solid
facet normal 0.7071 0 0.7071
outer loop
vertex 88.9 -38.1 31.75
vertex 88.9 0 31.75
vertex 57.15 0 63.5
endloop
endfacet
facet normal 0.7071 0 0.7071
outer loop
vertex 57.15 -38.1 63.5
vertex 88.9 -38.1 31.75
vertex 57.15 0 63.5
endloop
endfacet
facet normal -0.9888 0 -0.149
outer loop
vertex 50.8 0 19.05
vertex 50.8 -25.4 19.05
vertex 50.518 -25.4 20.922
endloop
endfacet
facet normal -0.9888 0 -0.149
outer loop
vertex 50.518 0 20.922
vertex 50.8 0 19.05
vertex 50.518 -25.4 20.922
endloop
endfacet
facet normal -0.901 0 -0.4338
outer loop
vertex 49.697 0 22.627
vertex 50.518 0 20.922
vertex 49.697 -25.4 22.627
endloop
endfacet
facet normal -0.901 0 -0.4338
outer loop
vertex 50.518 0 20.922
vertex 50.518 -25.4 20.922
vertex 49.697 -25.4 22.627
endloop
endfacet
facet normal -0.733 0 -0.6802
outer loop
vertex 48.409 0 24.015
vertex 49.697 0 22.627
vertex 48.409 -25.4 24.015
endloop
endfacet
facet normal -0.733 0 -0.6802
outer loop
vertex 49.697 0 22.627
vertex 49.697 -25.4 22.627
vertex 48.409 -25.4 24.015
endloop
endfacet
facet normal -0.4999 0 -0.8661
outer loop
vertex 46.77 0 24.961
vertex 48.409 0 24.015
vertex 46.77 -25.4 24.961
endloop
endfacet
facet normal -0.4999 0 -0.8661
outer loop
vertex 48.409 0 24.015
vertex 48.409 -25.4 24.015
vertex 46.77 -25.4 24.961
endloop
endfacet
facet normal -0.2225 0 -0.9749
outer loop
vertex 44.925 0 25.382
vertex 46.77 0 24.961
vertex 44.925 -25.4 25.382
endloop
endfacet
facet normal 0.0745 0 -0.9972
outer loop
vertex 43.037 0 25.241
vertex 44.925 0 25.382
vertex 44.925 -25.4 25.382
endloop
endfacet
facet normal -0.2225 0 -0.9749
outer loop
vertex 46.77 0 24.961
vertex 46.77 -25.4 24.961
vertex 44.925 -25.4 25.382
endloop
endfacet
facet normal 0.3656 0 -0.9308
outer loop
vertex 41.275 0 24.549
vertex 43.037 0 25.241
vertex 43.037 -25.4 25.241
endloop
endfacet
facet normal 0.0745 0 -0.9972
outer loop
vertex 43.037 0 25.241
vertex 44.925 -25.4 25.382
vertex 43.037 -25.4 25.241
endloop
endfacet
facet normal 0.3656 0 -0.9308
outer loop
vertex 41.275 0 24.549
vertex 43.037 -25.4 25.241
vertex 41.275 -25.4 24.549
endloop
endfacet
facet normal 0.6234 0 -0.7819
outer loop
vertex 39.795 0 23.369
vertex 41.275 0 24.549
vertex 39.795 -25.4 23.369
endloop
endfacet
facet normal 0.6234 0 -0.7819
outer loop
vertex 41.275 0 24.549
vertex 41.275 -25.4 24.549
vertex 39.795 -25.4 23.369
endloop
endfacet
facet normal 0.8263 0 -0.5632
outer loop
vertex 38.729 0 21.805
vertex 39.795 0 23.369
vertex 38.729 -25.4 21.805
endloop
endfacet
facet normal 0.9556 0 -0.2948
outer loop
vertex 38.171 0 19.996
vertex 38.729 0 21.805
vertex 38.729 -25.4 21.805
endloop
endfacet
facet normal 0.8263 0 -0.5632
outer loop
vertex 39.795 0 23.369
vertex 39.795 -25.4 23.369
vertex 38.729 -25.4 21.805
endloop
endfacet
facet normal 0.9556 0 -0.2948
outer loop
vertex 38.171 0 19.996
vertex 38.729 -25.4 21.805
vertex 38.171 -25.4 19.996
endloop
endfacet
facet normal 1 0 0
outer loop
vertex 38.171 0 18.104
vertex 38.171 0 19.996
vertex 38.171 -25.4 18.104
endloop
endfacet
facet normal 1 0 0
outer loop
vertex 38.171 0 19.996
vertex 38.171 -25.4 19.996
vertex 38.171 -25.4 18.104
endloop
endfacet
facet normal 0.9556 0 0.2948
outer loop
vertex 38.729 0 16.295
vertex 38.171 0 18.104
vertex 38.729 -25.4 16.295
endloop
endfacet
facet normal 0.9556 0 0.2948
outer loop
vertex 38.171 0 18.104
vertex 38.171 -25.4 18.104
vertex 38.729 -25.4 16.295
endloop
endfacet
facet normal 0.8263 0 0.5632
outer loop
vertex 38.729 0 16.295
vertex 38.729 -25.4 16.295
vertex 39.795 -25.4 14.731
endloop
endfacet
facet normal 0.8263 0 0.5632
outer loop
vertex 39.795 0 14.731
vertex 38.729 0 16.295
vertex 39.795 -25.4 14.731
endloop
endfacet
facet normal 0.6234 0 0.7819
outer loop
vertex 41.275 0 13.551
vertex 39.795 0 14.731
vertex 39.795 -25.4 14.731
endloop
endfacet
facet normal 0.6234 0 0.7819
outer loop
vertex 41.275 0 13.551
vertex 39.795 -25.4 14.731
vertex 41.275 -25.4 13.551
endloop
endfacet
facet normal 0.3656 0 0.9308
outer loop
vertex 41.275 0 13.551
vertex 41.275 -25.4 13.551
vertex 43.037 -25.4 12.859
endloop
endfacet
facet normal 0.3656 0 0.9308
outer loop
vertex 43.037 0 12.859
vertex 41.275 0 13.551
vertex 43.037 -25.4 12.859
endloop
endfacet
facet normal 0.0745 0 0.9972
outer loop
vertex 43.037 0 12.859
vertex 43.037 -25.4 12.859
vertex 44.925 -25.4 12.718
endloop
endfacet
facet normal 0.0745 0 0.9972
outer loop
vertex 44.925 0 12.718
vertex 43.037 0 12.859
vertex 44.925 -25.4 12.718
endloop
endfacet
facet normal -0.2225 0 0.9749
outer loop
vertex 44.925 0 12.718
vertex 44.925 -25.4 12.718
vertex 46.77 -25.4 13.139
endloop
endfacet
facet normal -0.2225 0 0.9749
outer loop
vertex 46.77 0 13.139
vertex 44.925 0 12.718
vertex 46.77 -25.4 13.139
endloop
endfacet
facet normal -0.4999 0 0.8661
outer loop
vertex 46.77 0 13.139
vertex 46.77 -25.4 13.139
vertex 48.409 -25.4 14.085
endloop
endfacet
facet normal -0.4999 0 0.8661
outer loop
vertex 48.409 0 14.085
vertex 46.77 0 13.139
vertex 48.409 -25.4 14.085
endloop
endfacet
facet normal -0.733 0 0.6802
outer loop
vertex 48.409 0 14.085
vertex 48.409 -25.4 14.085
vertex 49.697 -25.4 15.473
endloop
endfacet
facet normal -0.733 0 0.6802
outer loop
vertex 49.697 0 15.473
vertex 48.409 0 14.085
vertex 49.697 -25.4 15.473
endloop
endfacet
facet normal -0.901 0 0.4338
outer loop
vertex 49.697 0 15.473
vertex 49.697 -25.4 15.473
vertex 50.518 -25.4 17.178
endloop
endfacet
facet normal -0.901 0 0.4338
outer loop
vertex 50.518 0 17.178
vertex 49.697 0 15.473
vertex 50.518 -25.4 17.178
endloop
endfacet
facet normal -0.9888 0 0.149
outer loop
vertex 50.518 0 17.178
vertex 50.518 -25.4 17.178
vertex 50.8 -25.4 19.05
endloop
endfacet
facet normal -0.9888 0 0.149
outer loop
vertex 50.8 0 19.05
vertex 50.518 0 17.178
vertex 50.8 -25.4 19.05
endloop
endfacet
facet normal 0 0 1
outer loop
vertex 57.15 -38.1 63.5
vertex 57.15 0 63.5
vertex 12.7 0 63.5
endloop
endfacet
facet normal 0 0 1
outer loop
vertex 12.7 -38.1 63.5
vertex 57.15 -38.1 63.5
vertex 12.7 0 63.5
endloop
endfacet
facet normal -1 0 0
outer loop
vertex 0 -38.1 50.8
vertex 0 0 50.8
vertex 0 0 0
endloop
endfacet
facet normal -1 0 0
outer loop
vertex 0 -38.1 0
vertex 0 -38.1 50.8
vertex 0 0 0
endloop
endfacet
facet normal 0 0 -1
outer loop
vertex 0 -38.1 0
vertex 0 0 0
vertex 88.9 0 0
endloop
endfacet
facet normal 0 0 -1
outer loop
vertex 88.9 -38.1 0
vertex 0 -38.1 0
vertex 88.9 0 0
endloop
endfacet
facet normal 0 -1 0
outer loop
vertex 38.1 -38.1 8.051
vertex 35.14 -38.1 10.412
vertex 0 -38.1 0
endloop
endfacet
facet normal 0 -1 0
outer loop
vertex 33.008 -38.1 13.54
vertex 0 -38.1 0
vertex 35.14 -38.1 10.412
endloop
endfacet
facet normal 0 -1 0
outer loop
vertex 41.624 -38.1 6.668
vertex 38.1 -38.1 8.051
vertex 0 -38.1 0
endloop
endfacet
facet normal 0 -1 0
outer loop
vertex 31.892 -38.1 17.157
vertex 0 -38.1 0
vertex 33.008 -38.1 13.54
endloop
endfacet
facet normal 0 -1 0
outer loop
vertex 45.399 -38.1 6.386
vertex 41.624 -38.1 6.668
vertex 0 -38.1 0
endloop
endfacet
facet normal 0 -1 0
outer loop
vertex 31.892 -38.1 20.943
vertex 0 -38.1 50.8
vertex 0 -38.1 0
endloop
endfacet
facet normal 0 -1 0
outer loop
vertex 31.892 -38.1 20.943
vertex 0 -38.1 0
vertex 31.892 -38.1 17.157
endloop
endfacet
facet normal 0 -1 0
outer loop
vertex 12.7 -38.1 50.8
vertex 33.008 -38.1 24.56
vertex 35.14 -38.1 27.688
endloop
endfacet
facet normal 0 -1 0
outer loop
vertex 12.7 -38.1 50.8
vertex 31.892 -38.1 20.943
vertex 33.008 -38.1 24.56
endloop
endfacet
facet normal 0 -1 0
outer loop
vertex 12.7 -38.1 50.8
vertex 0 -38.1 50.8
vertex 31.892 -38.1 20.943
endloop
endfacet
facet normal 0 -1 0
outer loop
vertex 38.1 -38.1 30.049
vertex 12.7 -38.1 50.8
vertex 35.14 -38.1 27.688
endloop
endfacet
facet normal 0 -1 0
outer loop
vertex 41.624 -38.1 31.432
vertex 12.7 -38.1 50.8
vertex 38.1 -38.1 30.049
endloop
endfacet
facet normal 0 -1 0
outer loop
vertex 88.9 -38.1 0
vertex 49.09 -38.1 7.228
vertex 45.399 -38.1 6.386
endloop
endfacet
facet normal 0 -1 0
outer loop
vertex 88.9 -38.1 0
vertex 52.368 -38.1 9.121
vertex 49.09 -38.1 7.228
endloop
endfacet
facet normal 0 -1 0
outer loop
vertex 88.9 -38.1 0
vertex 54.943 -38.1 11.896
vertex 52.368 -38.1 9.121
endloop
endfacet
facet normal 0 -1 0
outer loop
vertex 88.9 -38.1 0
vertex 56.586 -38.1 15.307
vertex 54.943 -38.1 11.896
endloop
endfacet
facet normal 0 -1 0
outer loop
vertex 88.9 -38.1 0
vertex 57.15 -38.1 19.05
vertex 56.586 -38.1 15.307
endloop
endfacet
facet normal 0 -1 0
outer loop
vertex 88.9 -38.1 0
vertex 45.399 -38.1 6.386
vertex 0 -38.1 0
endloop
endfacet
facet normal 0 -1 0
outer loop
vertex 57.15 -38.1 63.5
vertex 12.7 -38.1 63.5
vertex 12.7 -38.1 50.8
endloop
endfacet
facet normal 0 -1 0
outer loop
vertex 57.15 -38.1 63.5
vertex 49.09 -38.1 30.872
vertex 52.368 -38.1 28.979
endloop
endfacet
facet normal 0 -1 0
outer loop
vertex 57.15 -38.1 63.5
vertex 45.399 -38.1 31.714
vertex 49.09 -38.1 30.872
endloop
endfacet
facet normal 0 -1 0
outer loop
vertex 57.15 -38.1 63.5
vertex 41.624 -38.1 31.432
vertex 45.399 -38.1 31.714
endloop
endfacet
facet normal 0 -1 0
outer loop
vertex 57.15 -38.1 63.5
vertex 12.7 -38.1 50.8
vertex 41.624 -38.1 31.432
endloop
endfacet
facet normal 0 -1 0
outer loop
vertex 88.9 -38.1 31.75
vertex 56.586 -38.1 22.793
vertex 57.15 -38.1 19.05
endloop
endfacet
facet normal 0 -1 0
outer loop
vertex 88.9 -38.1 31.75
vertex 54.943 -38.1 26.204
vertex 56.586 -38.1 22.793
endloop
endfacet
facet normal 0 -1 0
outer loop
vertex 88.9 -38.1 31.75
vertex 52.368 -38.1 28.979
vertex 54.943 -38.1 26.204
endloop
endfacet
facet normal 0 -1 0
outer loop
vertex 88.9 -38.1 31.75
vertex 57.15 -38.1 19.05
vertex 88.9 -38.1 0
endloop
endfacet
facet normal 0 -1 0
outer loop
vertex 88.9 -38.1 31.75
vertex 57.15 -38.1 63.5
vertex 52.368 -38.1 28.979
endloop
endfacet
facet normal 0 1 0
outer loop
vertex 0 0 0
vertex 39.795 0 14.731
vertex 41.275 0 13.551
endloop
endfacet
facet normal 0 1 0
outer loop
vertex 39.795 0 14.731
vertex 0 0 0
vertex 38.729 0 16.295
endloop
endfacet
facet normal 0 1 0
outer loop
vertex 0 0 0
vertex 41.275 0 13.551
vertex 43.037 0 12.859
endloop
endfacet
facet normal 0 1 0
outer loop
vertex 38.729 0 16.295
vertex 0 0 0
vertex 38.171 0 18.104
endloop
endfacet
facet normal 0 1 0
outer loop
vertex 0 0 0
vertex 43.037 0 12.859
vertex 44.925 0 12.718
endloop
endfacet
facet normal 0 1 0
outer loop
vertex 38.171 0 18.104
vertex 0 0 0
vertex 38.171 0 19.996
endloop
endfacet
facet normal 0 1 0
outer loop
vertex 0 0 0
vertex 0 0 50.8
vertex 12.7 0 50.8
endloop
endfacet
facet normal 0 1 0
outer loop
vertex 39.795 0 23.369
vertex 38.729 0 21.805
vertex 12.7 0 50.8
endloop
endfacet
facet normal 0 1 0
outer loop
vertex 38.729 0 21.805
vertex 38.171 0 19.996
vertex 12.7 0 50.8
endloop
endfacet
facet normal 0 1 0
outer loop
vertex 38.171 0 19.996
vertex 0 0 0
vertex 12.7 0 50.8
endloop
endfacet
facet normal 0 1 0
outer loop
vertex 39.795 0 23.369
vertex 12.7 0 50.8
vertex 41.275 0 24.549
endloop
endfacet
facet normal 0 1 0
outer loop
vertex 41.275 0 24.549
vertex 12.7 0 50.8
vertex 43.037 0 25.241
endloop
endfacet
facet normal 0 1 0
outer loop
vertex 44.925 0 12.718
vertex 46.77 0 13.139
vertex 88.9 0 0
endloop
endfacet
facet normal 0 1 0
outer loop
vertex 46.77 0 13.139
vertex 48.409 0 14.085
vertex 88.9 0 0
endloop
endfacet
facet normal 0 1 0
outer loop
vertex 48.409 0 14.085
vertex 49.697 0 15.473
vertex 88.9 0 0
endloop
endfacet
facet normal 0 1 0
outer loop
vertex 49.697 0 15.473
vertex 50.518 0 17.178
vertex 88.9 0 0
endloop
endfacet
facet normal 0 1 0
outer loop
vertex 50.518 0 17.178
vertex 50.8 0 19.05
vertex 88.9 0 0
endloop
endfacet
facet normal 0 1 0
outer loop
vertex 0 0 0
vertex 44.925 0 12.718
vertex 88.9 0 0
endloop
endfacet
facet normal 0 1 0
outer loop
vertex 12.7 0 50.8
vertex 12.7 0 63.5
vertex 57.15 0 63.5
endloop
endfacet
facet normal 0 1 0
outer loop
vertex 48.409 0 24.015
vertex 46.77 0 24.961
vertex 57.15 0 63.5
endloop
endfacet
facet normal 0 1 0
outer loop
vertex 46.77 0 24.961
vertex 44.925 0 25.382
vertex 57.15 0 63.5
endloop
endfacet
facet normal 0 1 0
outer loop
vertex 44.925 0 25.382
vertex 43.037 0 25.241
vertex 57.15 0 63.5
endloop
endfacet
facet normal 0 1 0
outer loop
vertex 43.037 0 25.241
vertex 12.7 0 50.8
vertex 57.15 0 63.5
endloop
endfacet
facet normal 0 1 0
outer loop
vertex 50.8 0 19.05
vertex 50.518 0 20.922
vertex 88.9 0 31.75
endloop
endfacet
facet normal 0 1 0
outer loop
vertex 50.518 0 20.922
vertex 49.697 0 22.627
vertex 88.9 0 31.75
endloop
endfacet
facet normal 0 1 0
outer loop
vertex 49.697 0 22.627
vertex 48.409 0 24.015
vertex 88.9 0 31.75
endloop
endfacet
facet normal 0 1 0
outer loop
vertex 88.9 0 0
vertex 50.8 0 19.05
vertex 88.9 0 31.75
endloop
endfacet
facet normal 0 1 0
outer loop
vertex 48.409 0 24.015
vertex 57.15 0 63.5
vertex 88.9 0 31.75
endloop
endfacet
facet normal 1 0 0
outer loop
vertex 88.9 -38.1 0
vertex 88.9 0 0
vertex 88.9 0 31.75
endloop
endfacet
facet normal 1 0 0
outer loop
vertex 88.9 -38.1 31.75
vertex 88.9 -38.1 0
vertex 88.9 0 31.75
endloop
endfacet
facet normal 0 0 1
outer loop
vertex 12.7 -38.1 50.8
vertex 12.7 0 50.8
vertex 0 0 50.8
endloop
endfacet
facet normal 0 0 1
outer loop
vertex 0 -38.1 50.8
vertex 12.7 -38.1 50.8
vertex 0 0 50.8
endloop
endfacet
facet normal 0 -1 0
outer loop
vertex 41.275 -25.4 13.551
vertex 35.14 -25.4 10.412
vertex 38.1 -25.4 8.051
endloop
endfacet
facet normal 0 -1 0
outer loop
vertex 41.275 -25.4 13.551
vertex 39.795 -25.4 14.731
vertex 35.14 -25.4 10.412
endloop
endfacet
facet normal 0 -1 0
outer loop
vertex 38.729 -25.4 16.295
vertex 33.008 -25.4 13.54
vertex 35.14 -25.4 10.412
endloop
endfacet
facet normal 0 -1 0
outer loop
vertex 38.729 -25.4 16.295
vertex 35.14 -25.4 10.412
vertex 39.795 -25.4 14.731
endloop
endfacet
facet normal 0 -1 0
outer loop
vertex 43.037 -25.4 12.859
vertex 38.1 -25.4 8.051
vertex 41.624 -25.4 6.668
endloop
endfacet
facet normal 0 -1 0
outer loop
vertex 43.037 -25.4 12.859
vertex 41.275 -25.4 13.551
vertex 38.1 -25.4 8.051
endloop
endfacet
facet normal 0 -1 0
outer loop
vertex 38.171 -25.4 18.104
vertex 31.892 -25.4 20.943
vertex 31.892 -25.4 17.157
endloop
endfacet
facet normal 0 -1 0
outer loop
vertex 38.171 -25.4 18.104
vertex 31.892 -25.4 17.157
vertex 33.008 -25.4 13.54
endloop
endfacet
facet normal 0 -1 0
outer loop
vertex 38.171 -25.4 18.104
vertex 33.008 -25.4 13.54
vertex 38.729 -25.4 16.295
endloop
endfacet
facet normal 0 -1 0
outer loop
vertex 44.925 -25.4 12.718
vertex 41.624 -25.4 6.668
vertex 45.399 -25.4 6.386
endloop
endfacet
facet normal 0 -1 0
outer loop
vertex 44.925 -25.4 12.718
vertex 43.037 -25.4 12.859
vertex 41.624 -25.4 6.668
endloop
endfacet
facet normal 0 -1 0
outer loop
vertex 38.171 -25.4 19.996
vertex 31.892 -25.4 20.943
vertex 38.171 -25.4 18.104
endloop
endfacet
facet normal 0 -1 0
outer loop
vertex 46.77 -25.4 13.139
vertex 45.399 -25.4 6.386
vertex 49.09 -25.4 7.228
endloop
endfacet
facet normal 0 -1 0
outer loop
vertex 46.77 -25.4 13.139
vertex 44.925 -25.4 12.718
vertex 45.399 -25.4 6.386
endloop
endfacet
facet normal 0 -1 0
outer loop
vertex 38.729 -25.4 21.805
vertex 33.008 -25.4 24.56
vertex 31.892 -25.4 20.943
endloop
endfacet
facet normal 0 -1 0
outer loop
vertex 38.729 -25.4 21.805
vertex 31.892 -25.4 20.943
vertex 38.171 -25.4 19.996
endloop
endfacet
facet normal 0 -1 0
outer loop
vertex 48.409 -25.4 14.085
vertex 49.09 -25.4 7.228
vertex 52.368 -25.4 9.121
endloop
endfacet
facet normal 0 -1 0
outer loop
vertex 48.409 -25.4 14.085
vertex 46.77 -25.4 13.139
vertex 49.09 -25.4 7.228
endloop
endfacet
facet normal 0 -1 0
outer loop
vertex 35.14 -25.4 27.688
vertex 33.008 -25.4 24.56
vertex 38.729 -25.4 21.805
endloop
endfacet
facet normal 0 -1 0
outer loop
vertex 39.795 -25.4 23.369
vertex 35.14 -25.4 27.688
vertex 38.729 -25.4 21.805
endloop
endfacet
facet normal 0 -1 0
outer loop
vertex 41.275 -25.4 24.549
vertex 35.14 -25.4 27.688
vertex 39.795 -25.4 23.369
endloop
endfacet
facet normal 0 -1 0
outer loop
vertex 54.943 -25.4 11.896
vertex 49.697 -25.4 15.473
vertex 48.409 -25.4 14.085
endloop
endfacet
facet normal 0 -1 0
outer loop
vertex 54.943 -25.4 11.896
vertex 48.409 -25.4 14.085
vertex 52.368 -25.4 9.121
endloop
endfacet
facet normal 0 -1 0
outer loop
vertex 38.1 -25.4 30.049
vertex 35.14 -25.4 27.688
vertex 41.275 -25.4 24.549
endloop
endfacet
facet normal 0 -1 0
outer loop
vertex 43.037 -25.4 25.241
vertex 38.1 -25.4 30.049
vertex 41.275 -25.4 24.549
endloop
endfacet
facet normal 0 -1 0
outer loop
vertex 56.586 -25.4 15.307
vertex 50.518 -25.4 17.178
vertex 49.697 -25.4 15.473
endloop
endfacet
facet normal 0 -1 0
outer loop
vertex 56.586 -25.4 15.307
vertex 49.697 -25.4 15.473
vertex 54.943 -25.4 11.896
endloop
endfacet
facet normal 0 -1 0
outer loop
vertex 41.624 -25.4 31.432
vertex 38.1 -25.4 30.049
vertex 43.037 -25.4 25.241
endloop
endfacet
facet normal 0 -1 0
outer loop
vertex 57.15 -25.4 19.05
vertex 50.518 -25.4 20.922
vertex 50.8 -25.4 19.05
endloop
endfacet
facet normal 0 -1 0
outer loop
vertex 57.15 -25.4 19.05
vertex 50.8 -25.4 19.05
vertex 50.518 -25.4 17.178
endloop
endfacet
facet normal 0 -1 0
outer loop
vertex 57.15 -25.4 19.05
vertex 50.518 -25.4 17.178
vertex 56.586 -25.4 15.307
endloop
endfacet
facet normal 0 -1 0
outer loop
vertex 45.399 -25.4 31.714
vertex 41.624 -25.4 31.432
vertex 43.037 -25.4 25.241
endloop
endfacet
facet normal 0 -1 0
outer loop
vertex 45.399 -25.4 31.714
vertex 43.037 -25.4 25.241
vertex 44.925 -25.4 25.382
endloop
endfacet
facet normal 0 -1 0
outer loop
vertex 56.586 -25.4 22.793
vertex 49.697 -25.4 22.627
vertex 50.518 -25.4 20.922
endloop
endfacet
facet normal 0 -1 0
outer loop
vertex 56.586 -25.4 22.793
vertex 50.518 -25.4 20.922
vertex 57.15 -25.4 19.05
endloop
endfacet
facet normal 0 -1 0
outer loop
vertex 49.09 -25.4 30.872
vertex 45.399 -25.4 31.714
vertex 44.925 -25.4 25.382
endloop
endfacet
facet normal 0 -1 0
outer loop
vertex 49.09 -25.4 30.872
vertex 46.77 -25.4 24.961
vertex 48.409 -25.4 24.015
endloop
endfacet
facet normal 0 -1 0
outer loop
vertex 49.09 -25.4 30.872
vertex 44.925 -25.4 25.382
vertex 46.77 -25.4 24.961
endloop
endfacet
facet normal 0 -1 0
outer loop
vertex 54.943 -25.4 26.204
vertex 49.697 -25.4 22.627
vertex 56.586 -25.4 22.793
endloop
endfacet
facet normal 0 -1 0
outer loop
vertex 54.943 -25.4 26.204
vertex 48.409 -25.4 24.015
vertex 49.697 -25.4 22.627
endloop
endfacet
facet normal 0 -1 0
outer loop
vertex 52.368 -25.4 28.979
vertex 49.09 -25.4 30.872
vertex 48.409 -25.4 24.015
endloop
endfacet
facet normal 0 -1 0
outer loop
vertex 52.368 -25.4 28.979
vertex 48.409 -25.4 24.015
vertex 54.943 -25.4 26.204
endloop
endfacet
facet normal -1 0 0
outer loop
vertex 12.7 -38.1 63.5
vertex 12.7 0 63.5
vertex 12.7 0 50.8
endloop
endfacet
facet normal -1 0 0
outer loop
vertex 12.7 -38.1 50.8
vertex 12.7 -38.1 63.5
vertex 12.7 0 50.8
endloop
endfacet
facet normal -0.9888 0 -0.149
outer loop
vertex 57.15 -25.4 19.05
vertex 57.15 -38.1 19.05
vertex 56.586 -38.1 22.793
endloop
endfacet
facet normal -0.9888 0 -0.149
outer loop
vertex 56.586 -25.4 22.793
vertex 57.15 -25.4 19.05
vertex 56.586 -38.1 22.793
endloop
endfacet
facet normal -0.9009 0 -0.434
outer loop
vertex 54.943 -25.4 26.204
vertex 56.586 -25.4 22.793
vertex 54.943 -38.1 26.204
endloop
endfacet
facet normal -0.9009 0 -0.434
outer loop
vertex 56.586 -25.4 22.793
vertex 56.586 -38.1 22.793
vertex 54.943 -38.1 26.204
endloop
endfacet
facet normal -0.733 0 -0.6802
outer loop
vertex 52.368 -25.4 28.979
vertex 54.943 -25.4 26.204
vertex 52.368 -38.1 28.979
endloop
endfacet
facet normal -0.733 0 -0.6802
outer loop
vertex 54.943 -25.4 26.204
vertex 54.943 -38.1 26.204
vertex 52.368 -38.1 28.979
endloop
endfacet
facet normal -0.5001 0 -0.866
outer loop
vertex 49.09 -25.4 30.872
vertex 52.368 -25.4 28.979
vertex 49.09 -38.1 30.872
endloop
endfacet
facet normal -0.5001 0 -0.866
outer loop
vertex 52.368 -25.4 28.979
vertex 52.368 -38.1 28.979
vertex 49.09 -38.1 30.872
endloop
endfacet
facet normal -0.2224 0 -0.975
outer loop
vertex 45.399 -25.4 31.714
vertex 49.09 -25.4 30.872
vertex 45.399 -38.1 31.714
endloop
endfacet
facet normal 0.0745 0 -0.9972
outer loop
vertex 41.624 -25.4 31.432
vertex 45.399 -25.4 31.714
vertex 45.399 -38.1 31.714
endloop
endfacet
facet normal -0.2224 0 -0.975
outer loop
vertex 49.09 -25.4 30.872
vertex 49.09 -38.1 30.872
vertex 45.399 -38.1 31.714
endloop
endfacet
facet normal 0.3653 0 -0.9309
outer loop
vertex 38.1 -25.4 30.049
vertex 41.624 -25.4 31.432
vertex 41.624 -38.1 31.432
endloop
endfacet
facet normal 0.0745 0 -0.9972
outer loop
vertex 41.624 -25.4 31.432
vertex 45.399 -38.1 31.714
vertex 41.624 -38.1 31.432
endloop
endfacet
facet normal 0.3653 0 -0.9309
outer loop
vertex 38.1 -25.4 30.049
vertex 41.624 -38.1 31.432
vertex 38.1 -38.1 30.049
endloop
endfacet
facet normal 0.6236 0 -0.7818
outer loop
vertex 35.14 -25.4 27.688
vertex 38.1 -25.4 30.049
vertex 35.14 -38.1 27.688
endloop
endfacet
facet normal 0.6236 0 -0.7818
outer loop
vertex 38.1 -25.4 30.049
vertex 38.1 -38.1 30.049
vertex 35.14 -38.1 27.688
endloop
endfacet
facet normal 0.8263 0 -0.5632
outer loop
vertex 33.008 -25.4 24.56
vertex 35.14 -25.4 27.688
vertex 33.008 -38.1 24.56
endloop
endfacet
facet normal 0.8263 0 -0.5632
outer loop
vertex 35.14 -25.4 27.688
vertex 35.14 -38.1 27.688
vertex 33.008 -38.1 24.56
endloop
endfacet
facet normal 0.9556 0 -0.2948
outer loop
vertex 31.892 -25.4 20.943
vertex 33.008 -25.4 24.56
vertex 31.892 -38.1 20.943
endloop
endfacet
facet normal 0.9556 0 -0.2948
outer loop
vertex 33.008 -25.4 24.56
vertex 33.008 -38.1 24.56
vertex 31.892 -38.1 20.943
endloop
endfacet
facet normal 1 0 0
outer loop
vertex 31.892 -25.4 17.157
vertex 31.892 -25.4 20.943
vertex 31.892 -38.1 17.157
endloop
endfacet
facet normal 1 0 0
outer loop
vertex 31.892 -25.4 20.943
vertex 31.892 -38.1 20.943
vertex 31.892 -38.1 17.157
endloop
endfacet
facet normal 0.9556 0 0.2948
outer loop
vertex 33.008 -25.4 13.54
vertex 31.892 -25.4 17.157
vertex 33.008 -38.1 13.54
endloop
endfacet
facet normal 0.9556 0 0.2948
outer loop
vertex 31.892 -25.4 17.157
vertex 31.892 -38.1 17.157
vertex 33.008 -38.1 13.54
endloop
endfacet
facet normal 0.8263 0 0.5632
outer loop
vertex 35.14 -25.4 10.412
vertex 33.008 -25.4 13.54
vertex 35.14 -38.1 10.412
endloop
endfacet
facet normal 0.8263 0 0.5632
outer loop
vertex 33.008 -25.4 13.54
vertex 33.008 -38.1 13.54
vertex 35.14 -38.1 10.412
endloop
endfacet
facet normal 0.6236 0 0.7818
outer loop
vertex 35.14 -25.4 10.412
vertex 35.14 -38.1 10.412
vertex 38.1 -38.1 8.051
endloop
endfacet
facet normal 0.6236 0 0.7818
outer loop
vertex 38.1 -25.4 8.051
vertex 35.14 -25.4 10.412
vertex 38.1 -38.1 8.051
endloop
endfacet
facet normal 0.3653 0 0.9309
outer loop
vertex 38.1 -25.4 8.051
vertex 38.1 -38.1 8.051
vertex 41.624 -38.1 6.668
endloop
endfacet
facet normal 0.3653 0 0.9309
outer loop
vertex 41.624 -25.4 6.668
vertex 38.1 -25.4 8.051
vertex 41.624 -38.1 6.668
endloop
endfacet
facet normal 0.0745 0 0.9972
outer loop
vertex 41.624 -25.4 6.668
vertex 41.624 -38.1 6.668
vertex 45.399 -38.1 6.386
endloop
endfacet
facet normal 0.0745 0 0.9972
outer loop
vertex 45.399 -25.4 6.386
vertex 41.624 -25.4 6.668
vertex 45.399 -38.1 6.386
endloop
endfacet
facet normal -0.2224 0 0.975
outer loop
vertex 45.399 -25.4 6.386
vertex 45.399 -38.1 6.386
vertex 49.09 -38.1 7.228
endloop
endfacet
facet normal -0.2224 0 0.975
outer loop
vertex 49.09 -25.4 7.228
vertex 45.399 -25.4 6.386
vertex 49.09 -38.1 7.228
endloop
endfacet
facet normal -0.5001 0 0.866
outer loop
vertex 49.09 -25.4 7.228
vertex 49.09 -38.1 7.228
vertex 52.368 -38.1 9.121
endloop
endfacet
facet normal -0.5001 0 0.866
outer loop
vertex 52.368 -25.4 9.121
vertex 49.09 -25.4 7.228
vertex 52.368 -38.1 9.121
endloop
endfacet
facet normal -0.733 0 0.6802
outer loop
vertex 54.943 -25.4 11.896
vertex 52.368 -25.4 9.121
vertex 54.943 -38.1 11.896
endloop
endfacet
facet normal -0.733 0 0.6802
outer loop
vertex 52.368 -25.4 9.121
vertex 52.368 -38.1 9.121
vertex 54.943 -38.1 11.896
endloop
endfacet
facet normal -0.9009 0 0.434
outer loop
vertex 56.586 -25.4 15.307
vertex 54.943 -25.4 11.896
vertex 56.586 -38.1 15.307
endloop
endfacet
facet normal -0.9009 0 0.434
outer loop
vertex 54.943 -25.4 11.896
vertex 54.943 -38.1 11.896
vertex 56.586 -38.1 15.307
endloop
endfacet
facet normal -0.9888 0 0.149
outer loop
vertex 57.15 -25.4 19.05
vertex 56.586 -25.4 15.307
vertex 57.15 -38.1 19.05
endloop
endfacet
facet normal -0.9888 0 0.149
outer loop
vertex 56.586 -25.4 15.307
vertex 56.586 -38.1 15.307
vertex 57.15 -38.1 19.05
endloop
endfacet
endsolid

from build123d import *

# Parameters (mm, degrees)
F1_DEPTH = 38.1
F2_R     = 12.7
F3_DEPTH = 12.7
F4_R     = 6.35
F5_DEPTH = 25.401


with BuildPart() as f1:
    # F0 (on Front) → F1 (new body)
    with BuildSketch(Plane.XZ):
        Polygon((0, 50.8), (0, 0), (88.9, 0), (88.9, 31.75), (57.15, 63.5), (12.7, 63.5), (12.7, 50.8), align=None)
    extrude(amount=F1_DEPTH)

    # F2 (on face) → F3 (cut)
    with BuildSketch(Plane.XZ.offset(38.1)):
        with Locations((44.45, 19.05)):
            Circle(F2_R)
    extrude(amount=-F3_DEPTH, mode=Mode.SUBTRACT)

    # F4 (on face) → F5 (cut, through all)
    with BuildSketch(Plane.XZ.offset(25.4)):
        with Locations((44.45, 19.05)):
            Circle(F4_R)
    extrude(amount=-F5_DEPTH, mode=Mode.SUBTRACT)


solid = f1.part
